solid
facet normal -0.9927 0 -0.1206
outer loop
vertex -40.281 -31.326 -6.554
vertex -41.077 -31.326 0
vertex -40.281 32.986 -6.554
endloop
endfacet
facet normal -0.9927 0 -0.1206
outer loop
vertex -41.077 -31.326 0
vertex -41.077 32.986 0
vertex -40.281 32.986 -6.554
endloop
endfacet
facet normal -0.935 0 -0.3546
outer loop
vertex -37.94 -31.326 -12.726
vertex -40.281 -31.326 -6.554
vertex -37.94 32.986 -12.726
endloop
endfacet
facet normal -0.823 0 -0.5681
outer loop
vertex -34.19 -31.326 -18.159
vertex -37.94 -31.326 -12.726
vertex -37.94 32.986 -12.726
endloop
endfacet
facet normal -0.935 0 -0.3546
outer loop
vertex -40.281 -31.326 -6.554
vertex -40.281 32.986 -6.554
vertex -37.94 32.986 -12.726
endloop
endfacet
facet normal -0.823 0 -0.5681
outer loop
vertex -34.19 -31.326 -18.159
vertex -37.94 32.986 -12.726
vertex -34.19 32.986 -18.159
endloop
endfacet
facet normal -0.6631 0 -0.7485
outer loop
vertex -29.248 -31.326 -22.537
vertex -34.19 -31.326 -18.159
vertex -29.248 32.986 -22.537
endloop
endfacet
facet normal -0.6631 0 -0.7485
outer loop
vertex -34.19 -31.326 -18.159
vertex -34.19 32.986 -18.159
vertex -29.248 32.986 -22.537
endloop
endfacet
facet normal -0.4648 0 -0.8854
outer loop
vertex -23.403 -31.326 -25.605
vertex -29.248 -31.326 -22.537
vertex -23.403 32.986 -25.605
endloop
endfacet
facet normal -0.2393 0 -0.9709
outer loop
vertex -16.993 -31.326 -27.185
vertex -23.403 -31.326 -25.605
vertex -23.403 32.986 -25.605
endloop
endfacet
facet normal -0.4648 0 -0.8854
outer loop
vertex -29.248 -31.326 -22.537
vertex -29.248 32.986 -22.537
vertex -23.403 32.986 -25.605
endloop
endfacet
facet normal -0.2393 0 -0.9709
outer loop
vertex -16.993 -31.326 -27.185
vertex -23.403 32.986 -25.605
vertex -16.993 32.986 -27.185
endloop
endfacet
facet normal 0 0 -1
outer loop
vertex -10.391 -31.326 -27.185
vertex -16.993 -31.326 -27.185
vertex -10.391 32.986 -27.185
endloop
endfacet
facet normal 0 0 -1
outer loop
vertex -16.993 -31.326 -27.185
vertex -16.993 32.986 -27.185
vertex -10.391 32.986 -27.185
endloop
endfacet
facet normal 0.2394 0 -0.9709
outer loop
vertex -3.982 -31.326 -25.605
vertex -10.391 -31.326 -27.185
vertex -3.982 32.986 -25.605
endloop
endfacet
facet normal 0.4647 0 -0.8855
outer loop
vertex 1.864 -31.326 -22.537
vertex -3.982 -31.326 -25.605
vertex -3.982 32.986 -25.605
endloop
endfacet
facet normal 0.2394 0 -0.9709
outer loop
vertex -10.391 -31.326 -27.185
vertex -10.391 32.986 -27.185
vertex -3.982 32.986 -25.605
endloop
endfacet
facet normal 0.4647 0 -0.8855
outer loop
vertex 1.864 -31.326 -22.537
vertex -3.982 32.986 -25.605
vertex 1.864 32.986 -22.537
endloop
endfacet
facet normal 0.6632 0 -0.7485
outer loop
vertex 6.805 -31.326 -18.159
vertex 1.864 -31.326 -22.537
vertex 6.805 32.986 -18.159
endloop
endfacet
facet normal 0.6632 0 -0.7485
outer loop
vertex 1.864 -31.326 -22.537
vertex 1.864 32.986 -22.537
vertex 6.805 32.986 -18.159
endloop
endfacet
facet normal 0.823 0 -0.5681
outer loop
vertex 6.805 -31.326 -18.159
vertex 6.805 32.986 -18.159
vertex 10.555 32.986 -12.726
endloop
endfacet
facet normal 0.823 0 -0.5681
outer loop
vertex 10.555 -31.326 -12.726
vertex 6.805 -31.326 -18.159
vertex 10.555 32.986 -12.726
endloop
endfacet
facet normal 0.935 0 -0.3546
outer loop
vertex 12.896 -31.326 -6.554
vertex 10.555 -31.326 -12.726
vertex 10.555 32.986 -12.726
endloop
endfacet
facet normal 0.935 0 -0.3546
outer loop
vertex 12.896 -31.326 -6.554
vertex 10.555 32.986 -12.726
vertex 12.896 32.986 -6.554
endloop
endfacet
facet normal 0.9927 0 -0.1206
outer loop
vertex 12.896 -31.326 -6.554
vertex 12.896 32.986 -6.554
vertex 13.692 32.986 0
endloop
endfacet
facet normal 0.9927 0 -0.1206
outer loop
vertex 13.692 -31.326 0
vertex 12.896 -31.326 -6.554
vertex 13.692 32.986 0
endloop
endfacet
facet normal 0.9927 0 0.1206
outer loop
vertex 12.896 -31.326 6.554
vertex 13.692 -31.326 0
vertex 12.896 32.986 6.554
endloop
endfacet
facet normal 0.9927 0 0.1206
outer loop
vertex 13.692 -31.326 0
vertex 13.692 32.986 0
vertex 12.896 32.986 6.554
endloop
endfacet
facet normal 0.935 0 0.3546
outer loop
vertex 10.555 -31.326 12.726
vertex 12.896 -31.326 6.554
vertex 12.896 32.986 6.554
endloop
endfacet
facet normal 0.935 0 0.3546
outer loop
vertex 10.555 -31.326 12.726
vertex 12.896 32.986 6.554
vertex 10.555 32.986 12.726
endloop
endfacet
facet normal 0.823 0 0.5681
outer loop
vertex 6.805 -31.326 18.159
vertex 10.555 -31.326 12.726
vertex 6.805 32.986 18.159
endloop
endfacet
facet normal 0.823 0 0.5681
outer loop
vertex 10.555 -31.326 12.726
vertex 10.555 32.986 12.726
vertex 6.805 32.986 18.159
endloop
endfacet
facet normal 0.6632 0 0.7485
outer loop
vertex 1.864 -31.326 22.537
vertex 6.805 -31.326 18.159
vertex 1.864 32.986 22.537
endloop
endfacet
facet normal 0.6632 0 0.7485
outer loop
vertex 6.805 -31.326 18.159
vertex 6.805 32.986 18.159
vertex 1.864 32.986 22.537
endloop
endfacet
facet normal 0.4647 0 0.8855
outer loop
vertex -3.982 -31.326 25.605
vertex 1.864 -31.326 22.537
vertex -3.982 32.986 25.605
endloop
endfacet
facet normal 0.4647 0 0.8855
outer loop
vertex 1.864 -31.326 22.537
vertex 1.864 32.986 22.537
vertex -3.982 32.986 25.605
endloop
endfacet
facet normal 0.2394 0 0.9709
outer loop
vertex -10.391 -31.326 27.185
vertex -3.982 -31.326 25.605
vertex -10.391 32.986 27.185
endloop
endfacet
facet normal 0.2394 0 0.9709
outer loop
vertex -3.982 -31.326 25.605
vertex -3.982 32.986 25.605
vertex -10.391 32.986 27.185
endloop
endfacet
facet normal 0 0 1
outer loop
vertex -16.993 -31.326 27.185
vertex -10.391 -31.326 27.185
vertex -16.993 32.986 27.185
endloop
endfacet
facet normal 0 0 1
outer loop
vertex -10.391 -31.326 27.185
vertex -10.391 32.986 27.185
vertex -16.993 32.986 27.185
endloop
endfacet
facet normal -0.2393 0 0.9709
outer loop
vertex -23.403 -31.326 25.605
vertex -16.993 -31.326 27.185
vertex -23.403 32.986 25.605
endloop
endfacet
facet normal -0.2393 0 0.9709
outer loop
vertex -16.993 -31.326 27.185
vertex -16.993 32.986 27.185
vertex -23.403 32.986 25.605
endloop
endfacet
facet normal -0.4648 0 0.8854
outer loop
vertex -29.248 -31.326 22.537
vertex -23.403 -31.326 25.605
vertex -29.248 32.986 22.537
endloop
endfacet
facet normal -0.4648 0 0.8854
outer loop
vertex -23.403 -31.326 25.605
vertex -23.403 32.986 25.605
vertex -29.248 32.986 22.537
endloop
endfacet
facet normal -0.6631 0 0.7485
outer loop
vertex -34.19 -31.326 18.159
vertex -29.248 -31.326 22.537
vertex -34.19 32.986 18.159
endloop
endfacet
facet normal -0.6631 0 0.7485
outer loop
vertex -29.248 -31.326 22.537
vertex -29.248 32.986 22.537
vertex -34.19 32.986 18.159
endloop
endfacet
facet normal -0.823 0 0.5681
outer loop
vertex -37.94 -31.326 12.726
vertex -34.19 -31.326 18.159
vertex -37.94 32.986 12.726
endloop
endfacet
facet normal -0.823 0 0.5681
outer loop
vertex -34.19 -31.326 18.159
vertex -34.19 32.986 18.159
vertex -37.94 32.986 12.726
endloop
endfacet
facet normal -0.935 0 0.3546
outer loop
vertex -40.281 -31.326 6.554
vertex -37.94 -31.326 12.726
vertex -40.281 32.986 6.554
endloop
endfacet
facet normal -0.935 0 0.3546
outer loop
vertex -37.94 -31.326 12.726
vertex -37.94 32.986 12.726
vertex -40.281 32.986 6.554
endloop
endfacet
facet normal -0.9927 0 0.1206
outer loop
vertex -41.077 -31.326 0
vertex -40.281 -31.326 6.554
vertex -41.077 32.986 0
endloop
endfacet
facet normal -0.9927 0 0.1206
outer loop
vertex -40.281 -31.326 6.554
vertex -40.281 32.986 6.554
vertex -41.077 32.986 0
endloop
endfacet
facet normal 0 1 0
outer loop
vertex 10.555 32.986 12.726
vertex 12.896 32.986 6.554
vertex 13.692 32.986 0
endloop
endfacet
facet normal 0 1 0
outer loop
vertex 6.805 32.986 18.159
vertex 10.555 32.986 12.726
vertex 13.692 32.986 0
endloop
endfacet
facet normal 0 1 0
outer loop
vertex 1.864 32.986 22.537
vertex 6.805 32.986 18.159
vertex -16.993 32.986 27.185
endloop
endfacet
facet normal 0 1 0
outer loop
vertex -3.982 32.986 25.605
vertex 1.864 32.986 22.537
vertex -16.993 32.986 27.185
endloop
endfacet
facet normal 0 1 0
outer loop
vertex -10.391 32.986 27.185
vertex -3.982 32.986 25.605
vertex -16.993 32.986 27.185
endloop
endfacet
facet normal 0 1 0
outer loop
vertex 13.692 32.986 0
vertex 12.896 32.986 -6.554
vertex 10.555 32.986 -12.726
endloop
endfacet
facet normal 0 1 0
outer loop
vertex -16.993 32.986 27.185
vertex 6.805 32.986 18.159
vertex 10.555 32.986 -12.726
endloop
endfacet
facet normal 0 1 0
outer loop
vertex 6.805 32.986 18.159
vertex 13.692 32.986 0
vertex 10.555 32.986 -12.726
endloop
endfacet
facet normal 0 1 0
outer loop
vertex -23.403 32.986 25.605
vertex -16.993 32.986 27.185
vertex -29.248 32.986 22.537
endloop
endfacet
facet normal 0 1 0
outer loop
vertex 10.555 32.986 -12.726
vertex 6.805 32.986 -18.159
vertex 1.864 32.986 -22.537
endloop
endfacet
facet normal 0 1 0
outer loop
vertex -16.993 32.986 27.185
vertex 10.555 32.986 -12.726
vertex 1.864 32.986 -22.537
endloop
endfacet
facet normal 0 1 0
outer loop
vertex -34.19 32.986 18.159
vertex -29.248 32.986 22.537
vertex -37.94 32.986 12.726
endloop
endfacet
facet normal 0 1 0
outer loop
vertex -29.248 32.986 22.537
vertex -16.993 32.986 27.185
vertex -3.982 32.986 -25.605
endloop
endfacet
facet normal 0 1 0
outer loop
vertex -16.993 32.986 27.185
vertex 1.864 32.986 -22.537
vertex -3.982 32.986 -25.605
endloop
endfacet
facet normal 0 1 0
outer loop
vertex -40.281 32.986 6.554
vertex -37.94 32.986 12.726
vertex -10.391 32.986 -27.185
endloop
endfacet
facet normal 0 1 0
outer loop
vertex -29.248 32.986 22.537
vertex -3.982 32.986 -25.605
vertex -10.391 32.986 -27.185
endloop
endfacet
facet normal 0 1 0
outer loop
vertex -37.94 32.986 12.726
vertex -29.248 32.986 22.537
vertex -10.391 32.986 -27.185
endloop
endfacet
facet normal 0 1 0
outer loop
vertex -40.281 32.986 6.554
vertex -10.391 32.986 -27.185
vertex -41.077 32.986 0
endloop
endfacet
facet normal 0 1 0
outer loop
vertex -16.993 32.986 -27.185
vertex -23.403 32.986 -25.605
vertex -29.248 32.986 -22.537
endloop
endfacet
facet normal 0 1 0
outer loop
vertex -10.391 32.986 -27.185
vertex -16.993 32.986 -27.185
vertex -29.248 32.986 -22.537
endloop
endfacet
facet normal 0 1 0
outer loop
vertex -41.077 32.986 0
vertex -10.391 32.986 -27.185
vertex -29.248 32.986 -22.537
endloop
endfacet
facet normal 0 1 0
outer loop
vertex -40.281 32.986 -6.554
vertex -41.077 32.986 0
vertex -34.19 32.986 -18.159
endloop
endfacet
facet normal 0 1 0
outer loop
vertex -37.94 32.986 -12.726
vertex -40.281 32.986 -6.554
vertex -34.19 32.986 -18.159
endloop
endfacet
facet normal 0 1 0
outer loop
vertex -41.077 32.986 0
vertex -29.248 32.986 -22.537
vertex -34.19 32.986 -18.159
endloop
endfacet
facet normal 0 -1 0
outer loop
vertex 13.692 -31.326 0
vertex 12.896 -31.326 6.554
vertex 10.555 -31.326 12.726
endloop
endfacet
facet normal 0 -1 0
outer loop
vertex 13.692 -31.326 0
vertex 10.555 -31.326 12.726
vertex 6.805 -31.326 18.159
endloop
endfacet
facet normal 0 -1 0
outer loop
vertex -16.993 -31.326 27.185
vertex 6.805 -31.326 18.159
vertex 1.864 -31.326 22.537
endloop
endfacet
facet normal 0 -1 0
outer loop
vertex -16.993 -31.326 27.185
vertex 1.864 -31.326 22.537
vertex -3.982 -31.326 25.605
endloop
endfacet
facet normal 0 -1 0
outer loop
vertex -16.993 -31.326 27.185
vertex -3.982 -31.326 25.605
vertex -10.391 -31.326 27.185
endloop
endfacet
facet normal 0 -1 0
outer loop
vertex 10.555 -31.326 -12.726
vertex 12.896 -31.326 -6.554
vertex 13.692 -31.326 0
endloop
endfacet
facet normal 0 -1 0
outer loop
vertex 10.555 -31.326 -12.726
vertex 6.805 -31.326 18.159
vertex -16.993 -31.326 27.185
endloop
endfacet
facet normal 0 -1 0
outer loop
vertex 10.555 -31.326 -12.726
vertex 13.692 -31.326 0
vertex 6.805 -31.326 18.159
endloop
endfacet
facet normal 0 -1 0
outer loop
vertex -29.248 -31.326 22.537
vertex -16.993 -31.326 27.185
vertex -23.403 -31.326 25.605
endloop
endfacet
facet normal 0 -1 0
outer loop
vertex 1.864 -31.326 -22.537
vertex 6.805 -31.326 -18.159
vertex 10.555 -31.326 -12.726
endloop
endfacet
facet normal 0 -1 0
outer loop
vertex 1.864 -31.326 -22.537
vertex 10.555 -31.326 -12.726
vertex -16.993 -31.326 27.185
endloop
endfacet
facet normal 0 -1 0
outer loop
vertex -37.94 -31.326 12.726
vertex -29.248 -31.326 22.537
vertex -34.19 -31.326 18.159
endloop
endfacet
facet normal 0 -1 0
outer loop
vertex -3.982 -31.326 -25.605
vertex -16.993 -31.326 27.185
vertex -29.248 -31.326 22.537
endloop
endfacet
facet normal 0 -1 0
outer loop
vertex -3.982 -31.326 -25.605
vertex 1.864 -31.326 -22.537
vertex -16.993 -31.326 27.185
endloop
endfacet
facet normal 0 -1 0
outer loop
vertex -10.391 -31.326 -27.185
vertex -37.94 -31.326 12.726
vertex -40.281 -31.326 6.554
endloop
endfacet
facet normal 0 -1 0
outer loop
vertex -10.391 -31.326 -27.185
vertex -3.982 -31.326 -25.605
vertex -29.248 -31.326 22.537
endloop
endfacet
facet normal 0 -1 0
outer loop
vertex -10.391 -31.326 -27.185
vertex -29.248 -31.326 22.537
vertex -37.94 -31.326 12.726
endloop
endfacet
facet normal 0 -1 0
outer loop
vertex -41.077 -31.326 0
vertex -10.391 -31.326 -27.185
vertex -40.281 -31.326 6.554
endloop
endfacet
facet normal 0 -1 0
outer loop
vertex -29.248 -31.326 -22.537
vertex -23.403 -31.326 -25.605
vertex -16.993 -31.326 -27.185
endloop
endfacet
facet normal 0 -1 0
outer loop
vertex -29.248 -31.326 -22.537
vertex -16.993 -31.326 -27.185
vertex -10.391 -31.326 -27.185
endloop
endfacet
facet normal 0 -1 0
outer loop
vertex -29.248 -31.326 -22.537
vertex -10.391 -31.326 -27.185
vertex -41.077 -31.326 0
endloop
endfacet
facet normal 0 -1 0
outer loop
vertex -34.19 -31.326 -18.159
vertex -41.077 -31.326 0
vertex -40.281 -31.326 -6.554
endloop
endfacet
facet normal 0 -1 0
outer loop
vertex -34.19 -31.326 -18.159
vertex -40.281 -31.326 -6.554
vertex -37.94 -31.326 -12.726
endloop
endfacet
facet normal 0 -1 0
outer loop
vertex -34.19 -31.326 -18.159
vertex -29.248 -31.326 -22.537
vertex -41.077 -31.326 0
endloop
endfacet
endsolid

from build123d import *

# Parameters (mm, degrees)
F0_W     = 25.7850475609
F0_H     = 69.0255090594
F1_DEPTH = 97.1566960216
F2_W     = 29.3421596289
F2_H     = 68.0039366707
F3_DEPTH = 74.8365670443
F5_W     = 27.3843407631
F5_H     = 64.3117055297


with BuildPart() as f1:
    # F0 (on Top) → F1 (new body)
    with BuildSketch(Plane.XY):
        with Locations((44.0845470876, 10.3604607284)):
            Rectangle(F0_W, F0_H)
    extrude(amount=F1_DEPTH)

    # F2 (on face) → F3 (join)
    with BuildSketch(Plane.YZ.offset(56.977070868)):
        with Locations((14.6710798144, 47.3301787861)):
            Rectangle(F2_W, F2_H)
    extrude(amount=-F3_DEPTH)


with BuildPart() as f6:
    # F5 (on Top) → F6 (revolve)
    with BuildSketch(Plane.XY):
        with Locations((-27.3843705654, 0.8298419416)):
            Rectangle(F5_W, F5_H)
    revolve(axis=Axis((-13.6922001839, 0.8298419416, 0), (0, -1, 0)))


solid = f6.part
